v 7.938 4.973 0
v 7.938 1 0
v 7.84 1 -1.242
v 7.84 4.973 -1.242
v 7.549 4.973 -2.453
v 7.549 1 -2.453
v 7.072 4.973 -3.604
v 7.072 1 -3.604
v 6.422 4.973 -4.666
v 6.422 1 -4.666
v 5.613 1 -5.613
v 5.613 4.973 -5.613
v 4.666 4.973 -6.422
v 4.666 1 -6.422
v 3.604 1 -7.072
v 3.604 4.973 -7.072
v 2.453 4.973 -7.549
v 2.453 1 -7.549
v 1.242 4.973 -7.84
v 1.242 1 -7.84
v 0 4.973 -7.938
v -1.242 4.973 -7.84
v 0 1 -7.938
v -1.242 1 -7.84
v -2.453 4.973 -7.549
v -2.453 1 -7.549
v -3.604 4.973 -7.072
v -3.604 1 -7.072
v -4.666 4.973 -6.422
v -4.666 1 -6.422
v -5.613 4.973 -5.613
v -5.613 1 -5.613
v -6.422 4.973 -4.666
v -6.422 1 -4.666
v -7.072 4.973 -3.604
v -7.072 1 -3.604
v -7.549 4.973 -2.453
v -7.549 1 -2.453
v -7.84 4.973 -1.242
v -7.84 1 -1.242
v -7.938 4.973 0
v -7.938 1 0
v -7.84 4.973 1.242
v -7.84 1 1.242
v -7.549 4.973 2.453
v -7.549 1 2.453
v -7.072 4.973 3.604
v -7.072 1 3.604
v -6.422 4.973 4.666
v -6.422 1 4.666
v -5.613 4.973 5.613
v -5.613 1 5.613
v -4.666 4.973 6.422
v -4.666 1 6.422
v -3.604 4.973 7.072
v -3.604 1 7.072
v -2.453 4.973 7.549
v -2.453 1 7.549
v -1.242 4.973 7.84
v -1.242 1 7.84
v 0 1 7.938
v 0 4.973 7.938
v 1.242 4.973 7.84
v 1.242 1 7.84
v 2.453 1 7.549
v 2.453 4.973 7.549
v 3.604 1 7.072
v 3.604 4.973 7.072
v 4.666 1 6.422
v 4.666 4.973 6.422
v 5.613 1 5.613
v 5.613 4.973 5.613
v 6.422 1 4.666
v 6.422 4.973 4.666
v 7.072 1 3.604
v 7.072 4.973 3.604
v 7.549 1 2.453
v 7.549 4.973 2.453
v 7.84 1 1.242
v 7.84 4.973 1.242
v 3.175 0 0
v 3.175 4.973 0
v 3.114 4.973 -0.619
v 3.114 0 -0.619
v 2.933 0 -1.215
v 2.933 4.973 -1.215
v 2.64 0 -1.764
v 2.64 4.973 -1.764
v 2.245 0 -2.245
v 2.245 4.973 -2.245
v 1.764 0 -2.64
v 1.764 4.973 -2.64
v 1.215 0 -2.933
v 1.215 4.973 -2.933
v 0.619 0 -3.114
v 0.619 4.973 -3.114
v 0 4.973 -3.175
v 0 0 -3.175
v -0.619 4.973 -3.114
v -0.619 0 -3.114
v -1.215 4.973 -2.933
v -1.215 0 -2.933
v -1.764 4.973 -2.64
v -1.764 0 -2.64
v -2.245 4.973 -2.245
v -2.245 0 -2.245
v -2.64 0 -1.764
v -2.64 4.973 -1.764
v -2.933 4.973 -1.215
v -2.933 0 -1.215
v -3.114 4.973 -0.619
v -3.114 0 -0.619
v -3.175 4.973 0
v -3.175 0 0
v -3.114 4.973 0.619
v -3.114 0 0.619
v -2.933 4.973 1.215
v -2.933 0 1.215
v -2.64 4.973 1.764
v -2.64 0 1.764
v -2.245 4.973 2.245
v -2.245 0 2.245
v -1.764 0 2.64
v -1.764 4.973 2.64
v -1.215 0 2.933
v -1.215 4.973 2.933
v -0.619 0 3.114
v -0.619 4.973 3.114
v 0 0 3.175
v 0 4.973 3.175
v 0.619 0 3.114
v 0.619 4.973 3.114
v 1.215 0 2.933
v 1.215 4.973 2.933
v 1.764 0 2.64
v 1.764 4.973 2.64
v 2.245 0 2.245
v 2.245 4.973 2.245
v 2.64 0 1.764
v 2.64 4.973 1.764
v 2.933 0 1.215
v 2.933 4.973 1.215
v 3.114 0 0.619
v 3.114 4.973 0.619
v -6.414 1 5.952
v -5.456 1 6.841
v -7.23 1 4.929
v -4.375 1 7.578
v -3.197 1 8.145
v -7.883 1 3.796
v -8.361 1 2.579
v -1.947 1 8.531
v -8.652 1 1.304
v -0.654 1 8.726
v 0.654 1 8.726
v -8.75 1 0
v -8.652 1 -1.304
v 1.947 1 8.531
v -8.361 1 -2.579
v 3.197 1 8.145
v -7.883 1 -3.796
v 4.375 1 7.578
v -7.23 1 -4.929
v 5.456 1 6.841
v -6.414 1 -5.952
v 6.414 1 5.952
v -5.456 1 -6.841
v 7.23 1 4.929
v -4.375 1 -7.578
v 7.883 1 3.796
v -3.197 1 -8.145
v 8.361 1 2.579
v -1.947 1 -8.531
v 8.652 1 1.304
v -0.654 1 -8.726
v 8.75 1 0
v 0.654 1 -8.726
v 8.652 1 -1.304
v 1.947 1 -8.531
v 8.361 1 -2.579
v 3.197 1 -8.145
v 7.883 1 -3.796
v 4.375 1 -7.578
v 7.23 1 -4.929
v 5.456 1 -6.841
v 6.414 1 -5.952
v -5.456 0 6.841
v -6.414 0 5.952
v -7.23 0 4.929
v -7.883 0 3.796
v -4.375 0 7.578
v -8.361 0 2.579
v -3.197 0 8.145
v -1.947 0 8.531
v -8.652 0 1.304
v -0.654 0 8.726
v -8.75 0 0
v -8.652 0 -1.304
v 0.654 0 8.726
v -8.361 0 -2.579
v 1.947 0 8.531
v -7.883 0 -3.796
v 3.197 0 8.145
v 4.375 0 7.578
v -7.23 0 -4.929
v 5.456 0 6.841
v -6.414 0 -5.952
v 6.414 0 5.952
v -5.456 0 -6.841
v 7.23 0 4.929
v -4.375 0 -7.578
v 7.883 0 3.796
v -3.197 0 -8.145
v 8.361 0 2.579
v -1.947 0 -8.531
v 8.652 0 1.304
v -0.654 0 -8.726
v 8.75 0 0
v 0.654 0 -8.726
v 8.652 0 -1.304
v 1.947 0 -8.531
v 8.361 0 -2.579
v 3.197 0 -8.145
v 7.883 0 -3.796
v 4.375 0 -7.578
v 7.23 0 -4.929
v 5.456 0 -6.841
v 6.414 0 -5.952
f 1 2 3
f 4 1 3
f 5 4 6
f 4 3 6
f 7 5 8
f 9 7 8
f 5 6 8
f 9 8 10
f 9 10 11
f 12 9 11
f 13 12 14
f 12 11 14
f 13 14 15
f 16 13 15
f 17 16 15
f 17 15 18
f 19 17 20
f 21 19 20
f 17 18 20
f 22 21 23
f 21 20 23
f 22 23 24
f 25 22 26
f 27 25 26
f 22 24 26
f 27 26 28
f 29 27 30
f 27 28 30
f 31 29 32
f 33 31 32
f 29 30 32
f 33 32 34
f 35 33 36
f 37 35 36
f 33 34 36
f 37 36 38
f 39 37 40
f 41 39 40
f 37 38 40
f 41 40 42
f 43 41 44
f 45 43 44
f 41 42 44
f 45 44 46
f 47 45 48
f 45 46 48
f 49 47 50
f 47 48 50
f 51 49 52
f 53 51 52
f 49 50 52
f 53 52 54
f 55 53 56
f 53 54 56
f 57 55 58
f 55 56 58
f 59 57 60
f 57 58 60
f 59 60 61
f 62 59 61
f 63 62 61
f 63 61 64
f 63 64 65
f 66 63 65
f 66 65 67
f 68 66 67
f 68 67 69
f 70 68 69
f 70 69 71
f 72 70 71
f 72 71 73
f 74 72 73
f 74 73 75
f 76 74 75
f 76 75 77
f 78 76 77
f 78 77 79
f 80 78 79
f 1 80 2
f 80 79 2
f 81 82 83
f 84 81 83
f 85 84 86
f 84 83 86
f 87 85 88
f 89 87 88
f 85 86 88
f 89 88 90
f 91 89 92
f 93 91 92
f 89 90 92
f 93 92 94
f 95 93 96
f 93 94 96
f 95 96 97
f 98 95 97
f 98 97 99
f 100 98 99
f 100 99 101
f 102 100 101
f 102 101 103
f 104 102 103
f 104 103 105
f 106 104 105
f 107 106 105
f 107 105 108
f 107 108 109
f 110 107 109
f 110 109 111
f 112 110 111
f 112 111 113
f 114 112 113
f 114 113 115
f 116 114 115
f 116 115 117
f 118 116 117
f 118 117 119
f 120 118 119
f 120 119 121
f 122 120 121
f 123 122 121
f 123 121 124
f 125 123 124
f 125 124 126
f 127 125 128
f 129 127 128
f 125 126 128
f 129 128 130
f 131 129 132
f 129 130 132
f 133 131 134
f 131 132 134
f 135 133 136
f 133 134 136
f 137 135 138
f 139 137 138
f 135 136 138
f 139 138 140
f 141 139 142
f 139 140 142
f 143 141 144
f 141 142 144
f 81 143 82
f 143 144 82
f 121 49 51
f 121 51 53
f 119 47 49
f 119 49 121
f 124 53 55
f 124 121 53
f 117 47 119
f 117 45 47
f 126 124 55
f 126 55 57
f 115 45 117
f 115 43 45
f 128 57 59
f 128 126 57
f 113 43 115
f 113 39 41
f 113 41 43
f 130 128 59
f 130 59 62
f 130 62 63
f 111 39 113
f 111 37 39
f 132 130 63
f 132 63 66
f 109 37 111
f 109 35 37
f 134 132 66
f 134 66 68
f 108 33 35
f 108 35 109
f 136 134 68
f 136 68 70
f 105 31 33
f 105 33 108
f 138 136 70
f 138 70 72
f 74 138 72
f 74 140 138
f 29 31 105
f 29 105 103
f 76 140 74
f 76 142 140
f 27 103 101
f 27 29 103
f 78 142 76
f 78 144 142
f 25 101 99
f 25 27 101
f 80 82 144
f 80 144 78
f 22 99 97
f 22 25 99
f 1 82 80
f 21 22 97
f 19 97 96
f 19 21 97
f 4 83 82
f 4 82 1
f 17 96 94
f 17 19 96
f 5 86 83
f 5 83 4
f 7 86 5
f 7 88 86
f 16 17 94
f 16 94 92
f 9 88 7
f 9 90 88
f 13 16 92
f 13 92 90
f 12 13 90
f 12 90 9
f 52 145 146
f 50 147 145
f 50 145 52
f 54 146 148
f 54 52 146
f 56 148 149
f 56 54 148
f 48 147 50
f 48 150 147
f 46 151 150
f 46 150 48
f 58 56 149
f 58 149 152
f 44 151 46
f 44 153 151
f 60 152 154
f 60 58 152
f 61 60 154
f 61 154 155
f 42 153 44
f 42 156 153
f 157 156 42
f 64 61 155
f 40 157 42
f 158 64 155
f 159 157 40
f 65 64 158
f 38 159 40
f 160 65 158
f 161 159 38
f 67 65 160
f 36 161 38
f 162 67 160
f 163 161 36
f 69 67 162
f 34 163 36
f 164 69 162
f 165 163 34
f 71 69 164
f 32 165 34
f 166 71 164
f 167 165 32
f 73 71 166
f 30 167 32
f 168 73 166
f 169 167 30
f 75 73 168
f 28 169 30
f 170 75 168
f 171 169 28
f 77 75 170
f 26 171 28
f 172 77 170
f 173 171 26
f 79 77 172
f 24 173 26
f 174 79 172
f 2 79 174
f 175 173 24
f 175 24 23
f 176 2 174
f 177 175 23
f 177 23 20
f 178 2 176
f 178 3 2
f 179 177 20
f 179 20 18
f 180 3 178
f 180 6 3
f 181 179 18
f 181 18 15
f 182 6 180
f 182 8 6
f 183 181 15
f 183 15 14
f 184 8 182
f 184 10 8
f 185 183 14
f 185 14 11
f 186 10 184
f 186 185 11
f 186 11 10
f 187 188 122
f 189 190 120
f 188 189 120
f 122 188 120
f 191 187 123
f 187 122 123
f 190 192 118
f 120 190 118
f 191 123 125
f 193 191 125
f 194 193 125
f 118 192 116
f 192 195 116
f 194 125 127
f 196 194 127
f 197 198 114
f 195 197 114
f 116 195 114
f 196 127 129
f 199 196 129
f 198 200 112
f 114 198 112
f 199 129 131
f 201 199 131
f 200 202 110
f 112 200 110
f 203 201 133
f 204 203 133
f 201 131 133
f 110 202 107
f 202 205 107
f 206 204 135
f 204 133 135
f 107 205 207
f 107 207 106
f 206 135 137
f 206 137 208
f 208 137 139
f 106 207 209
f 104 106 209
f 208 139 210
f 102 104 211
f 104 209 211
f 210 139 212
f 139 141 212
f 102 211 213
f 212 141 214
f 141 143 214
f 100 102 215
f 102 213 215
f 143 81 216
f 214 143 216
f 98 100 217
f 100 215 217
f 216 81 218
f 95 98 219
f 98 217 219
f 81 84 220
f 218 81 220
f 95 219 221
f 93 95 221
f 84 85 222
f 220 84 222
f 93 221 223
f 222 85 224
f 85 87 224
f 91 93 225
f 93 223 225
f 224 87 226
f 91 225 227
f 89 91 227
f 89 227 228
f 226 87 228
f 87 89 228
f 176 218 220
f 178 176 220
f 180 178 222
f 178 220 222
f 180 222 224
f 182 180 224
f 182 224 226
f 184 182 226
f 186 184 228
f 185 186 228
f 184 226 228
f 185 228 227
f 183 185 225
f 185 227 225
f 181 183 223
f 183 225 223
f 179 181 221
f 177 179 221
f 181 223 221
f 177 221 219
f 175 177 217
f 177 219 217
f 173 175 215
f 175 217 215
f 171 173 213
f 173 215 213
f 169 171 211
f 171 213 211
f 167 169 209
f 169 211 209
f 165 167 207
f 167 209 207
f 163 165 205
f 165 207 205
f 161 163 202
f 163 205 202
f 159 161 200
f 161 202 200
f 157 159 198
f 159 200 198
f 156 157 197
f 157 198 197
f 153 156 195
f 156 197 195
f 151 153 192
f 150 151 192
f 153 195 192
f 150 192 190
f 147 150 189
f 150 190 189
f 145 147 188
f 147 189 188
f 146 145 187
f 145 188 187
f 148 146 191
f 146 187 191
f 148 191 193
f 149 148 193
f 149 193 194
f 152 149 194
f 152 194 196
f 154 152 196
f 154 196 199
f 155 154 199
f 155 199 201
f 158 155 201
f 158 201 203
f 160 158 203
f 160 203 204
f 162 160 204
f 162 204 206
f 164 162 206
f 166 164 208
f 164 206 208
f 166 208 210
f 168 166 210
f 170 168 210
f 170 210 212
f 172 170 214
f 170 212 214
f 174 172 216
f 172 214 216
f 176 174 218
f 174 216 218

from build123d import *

# Parameters (mm, degrees)
SKETCH1_R           = 8.75
BOSS_EXTRUDE1_DEPTH = 1
SKETCH2_R           = 7.9375
BOSS_EXTRUDE2_DEPTH = 3.973
SKETCH3_R           = 3.175
CUT_EXTRUDE1_DEPTH  = 5.973


with BuildPart() as part:
    # Sketch1 → Boss-Extrude1 (new body)
    with BuildSketch(Plane(origin=(0, 0, 0), x_dir=(1, 0, 0), z_dir=(0, 1, 0))):
        Circle(SKETCH1_R)
    extrude(amount=BOSS_EXTRUDE1_DEPTH)

    # Sketch2 → Boss-Extrude2 (add)
    with BuildSketch(Plane(origin=(0, 1, 0), x_dir=(1, 0, 0), z_dir=(0, 1, 0))):
        Circle(SKETCH2_R)
    extrude(amount=BOSS_EXTRUDE2_DEPTH)

    # Sketch3 → Cut-Extrude1 (cut, through all)
    with BuildSketch(Plane(origin=(0, 4.973, 0), x_dir=(1, 0, 0), z_dir=(0, 1, 0))):
        Circle(SKETCH3_R)
    extrude(amount=-CUT_EXTRUDE1_DEPTH, mode=Mode.SUBTRACT)


solid = part.part
